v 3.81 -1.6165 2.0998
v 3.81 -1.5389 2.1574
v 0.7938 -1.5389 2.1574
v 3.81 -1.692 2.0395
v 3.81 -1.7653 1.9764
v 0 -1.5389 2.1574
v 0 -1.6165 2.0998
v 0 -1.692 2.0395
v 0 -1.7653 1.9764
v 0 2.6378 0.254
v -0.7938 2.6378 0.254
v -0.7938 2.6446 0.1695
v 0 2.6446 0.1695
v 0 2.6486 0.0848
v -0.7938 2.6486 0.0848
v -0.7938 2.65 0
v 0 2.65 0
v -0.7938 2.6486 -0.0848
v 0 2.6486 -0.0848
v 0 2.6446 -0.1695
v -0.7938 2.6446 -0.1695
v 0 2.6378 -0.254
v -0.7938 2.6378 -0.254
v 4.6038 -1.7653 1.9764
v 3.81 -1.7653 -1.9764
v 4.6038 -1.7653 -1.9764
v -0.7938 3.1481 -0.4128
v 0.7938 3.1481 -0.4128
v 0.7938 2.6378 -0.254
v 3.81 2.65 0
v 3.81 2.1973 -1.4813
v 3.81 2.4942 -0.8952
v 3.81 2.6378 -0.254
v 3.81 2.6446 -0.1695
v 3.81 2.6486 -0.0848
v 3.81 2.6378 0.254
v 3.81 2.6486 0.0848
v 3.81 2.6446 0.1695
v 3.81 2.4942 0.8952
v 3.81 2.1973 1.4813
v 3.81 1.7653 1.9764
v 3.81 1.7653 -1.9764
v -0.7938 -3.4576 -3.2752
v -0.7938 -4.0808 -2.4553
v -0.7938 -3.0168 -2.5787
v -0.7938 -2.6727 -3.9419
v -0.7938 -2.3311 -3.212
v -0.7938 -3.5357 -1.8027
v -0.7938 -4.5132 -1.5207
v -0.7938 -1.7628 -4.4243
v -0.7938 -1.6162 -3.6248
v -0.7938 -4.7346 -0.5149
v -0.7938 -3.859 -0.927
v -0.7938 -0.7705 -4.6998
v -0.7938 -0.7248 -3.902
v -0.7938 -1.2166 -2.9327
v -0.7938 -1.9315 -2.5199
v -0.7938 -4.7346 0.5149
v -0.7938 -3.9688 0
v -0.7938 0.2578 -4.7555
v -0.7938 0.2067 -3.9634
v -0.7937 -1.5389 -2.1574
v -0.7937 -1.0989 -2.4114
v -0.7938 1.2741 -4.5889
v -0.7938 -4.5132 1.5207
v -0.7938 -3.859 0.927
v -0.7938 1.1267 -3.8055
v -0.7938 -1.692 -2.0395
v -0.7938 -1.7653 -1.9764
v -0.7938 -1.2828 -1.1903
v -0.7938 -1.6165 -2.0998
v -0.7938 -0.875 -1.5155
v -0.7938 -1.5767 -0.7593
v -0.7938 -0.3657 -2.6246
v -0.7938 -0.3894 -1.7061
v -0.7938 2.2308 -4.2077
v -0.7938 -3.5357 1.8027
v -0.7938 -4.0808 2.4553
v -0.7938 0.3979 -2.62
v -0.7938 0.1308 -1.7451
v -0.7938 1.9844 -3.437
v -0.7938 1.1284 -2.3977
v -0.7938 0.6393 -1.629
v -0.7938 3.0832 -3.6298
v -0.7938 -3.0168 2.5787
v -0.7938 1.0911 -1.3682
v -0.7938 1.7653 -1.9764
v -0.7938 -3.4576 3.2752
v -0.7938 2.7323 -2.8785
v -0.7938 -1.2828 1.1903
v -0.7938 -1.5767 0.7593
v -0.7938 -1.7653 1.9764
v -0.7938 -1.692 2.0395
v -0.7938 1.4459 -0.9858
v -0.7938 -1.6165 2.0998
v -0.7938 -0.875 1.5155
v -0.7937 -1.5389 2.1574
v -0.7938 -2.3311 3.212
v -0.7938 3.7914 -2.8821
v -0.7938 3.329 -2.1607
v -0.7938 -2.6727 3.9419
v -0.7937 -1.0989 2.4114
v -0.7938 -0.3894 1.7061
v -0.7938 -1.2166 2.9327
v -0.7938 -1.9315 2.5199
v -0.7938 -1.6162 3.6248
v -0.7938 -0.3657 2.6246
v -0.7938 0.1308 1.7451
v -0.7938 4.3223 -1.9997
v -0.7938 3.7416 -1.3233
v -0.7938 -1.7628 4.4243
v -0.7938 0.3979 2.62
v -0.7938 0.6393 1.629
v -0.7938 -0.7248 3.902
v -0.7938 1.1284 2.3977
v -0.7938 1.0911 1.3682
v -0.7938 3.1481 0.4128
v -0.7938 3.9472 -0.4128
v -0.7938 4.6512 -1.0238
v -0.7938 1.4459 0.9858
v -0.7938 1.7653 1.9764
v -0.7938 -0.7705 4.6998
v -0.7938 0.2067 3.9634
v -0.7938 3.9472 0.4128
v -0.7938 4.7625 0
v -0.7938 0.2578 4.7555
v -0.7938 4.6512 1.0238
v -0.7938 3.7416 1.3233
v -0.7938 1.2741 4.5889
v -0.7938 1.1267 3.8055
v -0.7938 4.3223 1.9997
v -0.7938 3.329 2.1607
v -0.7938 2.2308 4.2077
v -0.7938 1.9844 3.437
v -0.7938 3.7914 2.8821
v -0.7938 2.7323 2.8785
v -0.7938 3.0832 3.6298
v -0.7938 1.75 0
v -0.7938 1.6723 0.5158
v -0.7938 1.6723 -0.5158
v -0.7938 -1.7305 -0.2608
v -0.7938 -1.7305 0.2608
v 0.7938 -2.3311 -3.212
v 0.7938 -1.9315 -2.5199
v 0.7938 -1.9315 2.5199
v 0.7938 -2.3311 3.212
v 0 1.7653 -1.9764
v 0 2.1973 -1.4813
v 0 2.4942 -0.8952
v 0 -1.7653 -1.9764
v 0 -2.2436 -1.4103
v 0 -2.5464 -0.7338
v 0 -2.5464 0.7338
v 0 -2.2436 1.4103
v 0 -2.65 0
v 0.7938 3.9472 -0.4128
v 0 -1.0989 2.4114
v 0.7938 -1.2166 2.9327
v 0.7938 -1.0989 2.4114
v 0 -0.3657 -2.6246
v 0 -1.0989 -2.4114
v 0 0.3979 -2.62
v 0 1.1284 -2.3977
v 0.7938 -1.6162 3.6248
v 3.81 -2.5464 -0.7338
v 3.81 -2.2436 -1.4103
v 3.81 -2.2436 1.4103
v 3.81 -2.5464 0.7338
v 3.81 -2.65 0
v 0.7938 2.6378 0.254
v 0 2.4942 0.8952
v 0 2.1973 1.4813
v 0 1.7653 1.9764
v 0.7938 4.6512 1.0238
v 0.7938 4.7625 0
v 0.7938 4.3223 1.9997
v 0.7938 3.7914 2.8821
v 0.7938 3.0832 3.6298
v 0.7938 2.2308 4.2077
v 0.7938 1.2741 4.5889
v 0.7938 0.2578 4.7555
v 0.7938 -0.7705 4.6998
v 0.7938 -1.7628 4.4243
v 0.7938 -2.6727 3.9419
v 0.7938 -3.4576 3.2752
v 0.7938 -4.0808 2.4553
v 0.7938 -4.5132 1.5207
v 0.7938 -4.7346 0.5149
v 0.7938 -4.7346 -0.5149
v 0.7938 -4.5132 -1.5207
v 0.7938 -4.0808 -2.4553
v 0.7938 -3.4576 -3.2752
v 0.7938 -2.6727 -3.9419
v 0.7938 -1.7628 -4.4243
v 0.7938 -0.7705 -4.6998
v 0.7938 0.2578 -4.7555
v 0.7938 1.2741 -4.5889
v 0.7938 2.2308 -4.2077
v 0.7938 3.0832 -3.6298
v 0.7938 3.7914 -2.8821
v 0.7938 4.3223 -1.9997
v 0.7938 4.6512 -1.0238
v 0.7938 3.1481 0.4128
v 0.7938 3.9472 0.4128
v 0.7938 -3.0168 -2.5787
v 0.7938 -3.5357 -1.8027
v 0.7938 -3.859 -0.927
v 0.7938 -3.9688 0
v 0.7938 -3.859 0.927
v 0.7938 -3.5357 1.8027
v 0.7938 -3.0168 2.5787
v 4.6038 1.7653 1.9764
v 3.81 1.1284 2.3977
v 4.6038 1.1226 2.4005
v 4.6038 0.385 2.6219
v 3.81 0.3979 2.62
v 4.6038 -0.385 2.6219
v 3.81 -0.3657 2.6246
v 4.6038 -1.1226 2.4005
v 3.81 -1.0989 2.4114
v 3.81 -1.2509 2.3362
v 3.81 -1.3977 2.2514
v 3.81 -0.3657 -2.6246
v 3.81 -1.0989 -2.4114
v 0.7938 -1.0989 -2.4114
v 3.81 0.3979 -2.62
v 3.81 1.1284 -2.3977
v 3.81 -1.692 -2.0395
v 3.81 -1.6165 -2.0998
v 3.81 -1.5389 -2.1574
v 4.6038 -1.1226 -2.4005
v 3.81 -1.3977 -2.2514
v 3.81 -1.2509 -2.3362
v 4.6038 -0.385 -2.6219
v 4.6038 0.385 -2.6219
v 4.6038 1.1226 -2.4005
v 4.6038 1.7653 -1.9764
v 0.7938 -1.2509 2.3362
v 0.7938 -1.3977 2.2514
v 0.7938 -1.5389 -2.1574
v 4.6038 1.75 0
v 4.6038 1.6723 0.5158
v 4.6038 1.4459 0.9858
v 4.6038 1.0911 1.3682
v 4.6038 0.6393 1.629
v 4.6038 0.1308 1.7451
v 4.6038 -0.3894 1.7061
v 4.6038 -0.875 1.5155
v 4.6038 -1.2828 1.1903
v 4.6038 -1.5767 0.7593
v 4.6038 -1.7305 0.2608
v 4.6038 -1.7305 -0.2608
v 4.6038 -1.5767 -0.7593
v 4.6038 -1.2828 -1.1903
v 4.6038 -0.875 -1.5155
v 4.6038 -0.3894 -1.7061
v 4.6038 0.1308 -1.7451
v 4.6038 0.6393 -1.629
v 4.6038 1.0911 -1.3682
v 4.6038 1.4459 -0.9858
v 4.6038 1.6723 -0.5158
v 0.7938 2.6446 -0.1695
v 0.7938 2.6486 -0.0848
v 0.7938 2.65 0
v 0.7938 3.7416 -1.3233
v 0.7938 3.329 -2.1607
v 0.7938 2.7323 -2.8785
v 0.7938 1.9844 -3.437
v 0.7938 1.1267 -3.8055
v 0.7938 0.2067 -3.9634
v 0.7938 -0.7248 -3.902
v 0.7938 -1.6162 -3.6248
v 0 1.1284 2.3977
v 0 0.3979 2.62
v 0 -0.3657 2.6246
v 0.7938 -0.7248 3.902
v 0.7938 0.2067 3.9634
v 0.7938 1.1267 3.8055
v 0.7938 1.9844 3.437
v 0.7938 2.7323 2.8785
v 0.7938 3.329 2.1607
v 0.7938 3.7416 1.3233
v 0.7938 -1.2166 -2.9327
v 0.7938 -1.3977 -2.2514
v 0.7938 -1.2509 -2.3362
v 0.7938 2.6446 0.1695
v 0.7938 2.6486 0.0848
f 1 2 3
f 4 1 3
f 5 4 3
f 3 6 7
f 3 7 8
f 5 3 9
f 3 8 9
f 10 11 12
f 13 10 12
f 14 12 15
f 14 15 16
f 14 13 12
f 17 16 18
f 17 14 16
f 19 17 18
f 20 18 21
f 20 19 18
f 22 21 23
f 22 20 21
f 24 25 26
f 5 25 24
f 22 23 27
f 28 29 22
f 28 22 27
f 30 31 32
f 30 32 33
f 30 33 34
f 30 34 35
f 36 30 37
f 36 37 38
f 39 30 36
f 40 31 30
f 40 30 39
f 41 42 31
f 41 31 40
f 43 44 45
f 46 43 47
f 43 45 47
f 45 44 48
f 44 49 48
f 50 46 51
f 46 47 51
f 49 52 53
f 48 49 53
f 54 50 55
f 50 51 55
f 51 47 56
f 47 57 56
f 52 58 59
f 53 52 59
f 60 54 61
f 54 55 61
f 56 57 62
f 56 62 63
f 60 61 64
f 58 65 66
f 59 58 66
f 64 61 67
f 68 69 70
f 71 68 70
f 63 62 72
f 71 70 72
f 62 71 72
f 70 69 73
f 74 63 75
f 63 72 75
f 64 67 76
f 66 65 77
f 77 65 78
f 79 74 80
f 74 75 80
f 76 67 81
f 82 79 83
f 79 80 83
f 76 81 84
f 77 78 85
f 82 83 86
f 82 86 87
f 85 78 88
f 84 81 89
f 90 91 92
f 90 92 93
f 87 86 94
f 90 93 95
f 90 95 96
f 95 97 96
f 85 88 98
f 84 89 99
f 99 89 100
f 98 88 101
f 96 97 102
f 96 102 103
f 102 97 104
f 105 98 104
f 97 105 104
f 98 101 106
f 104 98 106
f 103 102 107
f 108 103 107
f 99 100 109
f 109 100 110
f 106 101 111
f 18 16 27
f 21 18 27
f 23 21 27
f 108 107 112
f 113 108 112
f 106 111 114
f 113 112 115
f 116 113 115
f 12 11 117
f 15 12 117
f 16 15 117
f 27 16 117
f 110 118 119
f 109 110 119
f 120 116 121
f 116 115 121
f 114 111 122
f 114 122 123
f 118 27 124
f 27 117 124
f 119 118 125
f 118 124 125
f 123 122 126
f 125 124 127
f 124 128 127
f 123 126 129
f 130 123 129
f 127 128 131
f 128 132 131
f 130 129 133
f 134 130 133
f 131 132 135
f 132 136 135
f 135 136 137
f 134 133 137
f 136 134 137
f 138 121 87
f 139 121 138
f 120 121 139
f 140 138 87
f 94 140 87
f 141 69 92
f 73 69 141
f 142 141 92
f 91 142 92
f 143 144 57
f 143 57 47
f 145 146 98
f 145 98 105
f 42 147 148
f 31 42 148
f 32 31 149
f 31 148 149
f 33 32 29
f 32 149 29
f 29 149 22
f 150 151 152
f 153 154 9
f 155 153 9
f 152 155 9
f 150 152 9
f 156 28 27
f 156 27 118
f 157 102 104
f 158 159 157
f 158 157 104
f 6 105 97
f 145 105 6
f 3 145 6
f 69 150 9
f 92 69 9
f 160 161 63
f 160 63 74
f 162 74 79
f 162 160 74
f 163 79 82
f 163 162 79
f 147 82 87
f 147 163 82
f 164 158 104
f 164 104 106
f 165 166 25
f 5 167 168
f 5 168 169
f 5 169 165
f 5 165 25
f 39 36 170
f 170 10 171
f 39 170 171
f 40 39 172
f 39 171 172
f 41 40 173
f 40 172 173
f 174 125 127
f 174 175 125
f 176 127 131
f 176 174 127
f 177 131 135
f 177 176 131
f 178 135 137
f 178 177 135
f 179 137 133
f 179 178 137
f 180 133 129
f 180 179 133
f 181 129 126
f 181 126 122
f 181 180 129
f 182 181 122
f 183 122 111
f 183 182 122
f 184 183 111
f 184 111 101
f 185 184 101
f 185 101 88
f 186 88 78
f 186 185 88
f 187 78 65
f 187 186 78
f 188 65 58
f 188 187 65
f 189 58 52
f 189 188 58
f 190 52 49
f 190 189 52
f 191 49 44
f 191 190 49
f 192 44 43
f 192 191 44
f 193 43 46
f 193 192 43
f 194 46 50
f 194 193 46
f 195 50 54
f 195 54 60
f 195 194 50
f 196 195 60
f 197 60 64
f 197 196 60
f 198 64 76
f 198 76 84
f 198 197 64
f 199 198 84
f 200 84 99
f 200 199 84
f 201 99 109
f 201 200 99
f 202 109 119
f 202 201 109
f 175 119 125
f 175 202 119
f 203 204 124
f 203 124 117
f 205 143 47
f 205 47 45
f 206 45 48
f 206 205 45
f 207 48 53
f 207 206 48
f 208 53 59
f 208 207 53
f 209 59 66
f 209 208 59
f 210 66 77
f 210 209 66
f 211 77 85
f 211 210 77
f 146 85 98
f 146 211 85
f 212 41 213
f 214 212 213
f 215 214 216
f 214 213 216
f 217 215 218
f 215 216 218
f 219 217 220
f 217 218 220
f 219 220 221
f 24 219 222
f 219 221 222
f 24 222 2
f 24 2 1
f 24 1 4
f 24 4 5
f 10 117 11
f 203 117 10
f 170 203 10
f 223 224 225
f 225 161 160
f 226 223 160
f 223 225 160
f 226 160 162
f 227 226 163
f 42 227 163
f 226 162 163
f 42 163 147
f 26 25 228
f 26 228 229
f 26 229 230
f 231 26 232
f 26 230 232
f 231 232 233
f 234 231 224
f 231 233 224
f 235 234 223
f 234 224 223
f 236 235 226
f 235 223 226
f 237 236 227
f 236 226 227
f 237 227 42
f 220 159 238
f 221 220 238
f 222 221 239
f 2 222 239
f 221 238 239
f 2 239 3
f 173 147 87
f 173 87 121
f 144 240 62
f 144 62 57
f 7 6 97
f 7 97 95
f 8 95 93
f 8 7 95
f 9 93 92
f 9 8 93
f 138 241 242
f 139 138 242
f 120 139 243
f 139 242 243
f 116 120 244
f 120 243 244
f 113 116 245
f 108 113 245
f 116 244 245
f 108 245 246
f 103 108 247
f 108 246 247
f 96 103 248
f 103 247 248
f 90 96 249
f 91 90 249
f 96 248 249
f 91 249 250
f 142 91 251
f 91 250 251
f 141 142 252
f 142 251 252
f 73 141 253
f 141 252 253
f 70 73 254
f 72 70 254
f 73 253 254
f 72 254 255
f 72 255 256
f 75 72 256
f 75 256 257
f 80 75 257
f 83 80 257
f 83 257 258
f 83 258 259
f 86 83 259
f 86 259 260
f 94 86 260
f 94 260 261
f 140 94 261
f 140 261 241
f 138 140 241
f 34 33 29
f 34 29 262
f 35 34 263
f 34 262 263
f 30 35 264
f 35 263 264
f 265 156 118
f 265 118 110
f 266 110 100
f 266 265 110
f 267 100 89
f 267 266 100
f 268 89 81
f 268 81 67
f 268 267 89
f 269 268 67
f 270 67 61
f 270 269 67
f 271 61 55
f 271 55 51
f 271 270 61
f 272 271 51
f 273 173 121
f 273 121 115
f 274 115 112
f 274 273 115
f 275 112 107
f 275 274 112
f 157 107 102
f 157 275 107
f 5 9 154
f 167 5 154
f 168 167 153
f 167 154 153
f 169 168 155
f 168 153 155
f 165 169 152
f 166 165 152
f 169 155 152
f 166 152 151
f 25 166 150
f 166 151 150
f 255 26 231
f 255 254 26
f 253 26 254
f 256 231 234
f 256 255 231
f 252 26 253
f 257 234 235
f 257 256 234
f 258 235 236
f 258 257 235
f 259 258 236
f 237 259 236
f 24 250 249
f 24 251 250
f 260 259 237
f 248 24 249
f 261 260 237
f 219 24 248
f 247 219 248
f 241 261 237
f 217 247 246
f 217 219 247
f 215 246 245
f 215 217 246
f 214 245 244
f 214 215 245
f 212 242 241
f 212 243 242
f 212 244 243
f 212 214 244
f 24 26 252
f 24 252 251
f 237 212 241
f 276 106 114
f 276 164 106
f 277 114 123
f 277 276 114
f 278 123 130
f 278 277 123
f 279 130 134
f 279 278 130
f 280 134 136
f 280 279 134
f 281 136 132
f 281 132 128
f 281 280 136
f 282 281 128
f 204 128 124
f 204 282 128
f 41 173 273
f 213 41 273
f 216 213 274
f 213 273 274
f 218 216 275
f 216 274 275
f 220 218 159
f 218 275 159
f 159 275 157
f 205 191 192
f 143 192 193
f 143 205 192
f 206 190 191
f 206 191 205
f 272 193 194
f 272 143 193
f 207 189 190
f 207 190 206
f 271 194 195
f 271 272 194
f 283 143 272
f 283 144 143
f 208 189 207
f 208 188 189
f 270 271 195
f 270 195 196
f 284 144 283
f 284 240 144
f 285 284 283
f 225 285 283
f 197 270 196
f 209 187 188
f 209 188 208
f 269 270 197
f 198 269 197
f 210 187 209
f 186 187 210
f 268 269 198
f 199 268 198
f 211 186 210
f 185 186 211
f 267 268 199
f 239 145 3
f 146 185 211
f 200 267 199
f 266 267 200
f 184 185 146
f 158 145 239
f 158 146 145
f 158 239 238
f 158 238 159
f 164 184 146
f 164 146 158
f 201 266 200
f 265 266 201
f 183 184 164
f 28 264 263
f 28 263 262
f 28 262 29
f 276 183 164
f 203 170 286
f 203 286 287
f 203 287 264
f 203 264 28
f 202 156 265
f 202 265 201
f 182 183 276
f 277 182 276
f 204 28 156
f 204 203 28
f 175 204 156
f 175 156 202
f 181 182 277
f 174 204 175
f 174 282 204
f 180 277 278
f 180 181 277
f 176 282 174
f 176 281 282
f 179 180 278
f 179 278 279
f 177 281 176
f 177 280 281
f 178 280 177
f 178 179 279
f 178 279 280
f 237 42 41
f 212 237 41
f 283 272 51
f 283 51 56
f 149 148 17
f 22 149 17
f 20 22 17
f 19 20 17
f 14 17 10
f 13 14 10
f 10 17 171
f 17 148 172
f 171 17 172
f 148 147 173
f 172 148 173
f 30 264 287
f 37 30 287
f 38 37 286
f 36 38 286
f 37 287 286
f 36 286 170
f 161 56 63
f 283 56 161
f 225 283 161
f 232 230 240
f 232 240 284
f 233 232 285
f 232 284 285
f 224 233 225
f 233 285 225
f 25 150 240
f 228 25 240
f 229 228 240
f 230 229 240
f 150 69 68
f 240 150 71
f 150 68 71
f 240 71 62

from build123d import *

# Parameters (mm, degrees)
F0_W     = 3.5306
F0_H     = 3.9528298268
F1_DEPTH = 0.79375
F2_DEPTH = 3.81
F3_W     = 3.5306
F3_H     = 3.9528298268
F4_DEPTH = 0.79375
F5_R     = 1.75
F6_DEPTH = 5.3985
F0_R     = 4.7625
F7_DEPTH = 0.79375


with BuildPart() as f1:
    # F0 (on Right) → F1 (new body)
    with BuildSketch(Plane.YZ):
        Rectangle(F0_W, F0_H)
        with BuildLine():
            Line((-1.7653, 1.9764149134), (1.7653, 1.9764149134))
            ThreePointArc((1.7653, 1.9764149134), (0.3978891493, 2.6199588212), (-1.0989290887, 2.4114010156))
            ThreePointArc((-1.0989290887, 2.4114010156), (-1.325, 2.29496732), (-1.5388699938, 2.1574010156))
            ThreePointArc((-1.5388699938, 2.1574010156), (-1.6545615218, 2.0700063214), (-1.7653, 1.9764149134))
        make_face()
        with BuildLine():
            ThreePointArc((-1.0989290887, -2.4114010156), (0.3978891493, -2.6199588212), (1.7653, -1.9764149134))
            Line((1.7653, -1.9764149134), (-1.7653, -1.9764149134))
            ThreePointArc((-1.7653, -1.9764149134), (-1.6545615218, -2.0700063214), (-1.5388699938, -2.1574010156))
            ThreePointArc((-1.5388699938, -2.1574010156), (-1.325, -2.29496732), (-1.0989290887, -2.4114010156))
        make_face()
    extrude(amount=-F1_DEPTH)

    # F0 (on Right) → F2 (join)
    with BuildSketch(Plane.YZ):
        with BuildLine():
            Line((-1.7653, 1.9764149134), (1.7653, 1.9764149134))
            ThreePointArc((1.7653, 1.9764149134), (0.3978891493, 2.6199588212), (-1.0989290887, 2.4114010156))
            ThreePointArc((-1.0989290887, 2.4114010156), (-1.325, 2.29496732), (-1.5388699938, 2.1574010156))
            ThreePointArc((-1.5388699938, 2.1574010156), (-1.6545615218, 2.0700063214), (-1.7653, 1.9764149134))
        make_face()
        with BuildLine():
            ThreePointArc((2.6377990826, -0.254), (2.6469480132, -0.1271464337), (2.65, 0))
            ThreePointArc((2.65, 0), (2.6469480132, 0.1271464337), (2.6377990826, 0.254))
            ThreePointArc((2.6377990826, 0.254), (2.3640005639, 1.1974979473), (1.7653, 1.9764149134))
            Line((1.7653, 1.9764149134), (1.7653, -1.9764149134))
            ThreePointArc((1.7653, -1.9764149134), (2.3640005639, -1.1974979473), (2.6377990826, -0.254))
        make_face()
        with BuildLine():
            Line((-1.7653, -1.9764149134), (-1.7653, 1.9764149134))
            ThreePointArc((-1.7653, 1.9764149134), (-2.65, 0), (-1.7653, -1.9764149134))
        make_face()
        Rectangle(F0_W, F0_H)
        with BuildLine():
            ThreePointArc((-1.0989290887, -2.4114010156), (0.3978891493, -2.6199588212), (1.7653, -1.9764149134))
            Line((1.7653, -1.9764149134), (-1.7653, -1.9764149134))
            ThreePointArc((-1.7653, -1.9764149134), (-1.6545615218, -2.0700063214), (-1.5388699938, -2.1574010156))
            ThreePointArc((-1.5388699938, -2.1574010156), (-1.325, -2.29496732), (-1.0989290887, -2.4114010156))
        make_face()
    extrude(amount=F2_DEPTH)

    # F3 (on face) → F4 (join)
    with BuildSketch(Plane.YZ.offset(3.81)):
        Rectangle(F3_W, F3_H)
        with BuildLine():
            ThreePointArc((1.7653, 1.9764149134), (0, 2.65), (-1.7653, 1.9764149134))
            Line((-1.7653, 1.9764149134), (1.7653, 1.9764149134))
        make_face()
        with BuildLine():
            Line((1.7653, -1.9764149134), (-1.7653, -1.9764149134))
            ThreePointArc((-1.7653, -1.9764149134), (0, -2.65), (1.7653, -1.9764149134))
        make_face()
    extrude(amount=F4_DEPTH)

    # F5 (on face) → F6 (cut, through all)
    with BuildSketch(Plane.YZ.offset(4.60375)):
        Circle(F5_R)
    extrude(amount=-F6_DEPTH, mode=Mode.SUBTRACT)

    # F0 (on Right) → F7 (join, symmetric)
    with BuildSketch(Plane.YZ):
        Circle(F0_R)
        with BuildLine():
            ThreePointArc((-1.6161623386, 3.6247752838), (1.984375, 3.4370383213), (3.9472286481, 0.41275))
            ThreePointArc((3.9472286481, 0.41275), (3.9633660101, 0.2066553478), (3.96875, 0))
            ThreePointArc((3.96875, 0), (3.9633660101, -0.2066553478), (3.9472286481, -0.41275))
            ThreePointArc((3.9472286481, -0.41275), (1.984375, -3.4370383213), (-1.6161623386, -3.6247752838))
            ThreePointArc((-1.6161623386, -3.6247752838), (-1.984375, -3.4370383213), (-2.3310663094, -3.2120252838))
            ThreePointArc((-2.3310663094, -3.2120252838), (-3.96875, 0), (-2.3310663094, 3.2120252838))
            ThreePointArc((-2.3310663094, 3.2120252838), (-1.984375, 3.4370383213), (-1.6161623386, 3.6247752838))
        make_face(mode=Mode.SUBTRACT)
        with BuildLine():
            ThreePointArc((2.6377990826, 0.254), (2.6469480132, 0.1271464337), (2.65, 0))
            ThreePointArc((2.65, 0), (2.6469480132, -0.1271464337), (2.6377990826, -0.254))
            Line((2.6377990826, -0.254), (3.1480569305, -0.41275))
            Line((3.1480569305, -0.41275), (3.9472286481, -0.41275))
            ThreePointArc((3.9472286481, -0.41275), (3.9633660101, -0.2066553478), (3.96875, 0))
            ThreePointArc((3.96875, 0), (3.9633660101, 0.2066553478), (3.9472286481, 0.41275))
            Line((3.9472286481, 0.41275), (3.1480569305, 0.41275))
            Line((3.1480569305, 0.41275), (2.6377990826, 0.254))
        make_face()
        with BuildLine():
            ThreePointArc((-1.5388699938, 2.1574010156), (-1.325, 2.29496732), (-1.0989290887, 2.4114010156))
            Line((-1.0989290887, 2.4114010156), (-1.2165764798, 2.9326722743))
            Line((-1.2165764798, 2.9326722743), (-1.6161623386, 3.6247752838))
            ThreePointArc((-1.6161623386, 3.6247752838), (-1.984375, 3.4370383213), (-2.3310663094, 3.2120252838))
            Line((-2.3310663094, 3.2120252838), (-1.9314804506, 2.5199222743))
            Line((-1.9314804506, 2.5199222743), (-1.5388699938, 2.1574010156))
        make_face()
        with BuildLine():
            Line((-1.2165764798, -2.9326722743), (-1.0989290887, -2.4114010156))
            ThreePointArc((-1.0989290887, -2.4114010156), (-1.325, -2.29496732), (-1.5388699938, -2.1574010156))
            Line((-1.5388699938, -2.1574010156), (-1.9314804506, -2.5199222743))
            Line((-1.9314804506, -2.5199222743), (-2.3310663094, -3.2120252838))
            ThreePointArc((-2.3310663094, -3.2120252838), (-1.984375, -3.4370383213), (-1.6161623386, -3.6247752838))
            Line((-1.6161623386, -3.6247752838), (-1.2165764798, -2.9326722743))
        make_face()
    extrude(amount=F7_DEPTH, both=True)


solid = f1.part
